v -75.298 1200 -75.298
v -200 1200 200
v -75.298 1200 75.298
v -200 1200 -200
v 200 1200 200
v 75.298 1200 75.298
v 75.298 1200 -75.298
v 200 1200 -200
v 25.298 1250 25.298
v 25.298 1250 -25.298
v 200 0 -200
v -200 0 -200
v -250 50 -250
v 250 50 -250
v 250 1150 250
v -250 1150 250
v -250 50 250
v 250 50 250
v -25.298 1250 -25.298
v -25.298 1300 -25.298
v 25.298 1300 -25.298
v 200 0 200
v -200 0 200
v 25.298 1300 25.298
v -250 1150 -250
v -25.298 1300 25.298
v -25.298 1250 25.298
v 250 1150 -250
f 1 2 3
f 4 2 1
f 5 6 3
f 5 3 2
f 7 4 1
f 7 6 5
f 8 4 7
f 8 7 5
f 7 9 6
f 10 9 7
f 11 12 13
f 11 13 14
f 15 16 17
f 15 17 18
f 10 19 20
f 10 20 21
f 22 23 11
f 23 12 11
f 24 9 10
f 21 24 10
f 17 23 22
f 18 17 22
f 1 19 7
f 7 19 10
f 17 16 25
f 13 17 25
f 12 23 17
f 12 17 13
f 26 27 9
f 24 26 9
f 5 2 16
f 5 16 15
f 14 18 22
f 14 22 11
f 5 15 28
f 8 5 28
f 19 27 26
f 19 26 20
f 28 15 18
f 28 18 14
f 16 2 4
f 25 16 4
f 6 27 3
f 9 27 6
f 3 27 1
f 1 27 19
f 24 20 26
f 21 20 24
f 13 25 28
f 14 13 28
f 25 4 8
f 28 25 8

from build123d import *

# Parameters (mm, degrees)
SKETCH1_W           = 500
SKETCH1_H           = 500
BOSS_EXTRUDE1_DEPTH = 1200
SKETCH2_W           = 50.59676849
SKETCH2_H           = 50.59676849
BOSS_EXTRUDE2_DEPTH = 100
CHAMFER1_SIZE       = 50


with BuildPart() as part:
    # Sketch1 → Boss-Extrude1 (new body)
    with BuildSketch(Plane(origin=(0, 0, 0), x_dir=(1, 0, 0), z_dir=(0, 1, 0))):
        Rectangle(SKETCH1_W, SKETCH1_H)
    extrude(amount=BOSS_EXTRUDE1_DEPTH)

    # Sketch2 → Boss-Extrude2 (add)
    with BuildSketch(Plane(origin=(0, 1200, 0), x_dir=(1, 0, 0), z_dir=(0, 1, 0))):
        Rectangle(SKETCH2_W, SKETCH2_H)
    extrude(amount=BOSS_EXTRUDE2_DEPTH)

    # Chamfer1
    chamfer1_edges = [part.edges().sort_by_distance(p)[0] for p in [
        (-250, 1200, 0),
        (25.298384245, 1200, 0),
        (0, 1200, -25.298384245),
        (-25.298384245, 1200, 0),
        (0, 1200, 250),
        (0, 1200, 25.298384245),
        (250, 1200, 0),
        (0, 0, 250),
        (-250, 0, 0),
        (0, 0, -250),
        (250, 0, 0),
        (0, 1200, -250),
    ]]
    chamfer(chamfer1_edges, length=CHAMFER1_SIZE)


solid = part.part
